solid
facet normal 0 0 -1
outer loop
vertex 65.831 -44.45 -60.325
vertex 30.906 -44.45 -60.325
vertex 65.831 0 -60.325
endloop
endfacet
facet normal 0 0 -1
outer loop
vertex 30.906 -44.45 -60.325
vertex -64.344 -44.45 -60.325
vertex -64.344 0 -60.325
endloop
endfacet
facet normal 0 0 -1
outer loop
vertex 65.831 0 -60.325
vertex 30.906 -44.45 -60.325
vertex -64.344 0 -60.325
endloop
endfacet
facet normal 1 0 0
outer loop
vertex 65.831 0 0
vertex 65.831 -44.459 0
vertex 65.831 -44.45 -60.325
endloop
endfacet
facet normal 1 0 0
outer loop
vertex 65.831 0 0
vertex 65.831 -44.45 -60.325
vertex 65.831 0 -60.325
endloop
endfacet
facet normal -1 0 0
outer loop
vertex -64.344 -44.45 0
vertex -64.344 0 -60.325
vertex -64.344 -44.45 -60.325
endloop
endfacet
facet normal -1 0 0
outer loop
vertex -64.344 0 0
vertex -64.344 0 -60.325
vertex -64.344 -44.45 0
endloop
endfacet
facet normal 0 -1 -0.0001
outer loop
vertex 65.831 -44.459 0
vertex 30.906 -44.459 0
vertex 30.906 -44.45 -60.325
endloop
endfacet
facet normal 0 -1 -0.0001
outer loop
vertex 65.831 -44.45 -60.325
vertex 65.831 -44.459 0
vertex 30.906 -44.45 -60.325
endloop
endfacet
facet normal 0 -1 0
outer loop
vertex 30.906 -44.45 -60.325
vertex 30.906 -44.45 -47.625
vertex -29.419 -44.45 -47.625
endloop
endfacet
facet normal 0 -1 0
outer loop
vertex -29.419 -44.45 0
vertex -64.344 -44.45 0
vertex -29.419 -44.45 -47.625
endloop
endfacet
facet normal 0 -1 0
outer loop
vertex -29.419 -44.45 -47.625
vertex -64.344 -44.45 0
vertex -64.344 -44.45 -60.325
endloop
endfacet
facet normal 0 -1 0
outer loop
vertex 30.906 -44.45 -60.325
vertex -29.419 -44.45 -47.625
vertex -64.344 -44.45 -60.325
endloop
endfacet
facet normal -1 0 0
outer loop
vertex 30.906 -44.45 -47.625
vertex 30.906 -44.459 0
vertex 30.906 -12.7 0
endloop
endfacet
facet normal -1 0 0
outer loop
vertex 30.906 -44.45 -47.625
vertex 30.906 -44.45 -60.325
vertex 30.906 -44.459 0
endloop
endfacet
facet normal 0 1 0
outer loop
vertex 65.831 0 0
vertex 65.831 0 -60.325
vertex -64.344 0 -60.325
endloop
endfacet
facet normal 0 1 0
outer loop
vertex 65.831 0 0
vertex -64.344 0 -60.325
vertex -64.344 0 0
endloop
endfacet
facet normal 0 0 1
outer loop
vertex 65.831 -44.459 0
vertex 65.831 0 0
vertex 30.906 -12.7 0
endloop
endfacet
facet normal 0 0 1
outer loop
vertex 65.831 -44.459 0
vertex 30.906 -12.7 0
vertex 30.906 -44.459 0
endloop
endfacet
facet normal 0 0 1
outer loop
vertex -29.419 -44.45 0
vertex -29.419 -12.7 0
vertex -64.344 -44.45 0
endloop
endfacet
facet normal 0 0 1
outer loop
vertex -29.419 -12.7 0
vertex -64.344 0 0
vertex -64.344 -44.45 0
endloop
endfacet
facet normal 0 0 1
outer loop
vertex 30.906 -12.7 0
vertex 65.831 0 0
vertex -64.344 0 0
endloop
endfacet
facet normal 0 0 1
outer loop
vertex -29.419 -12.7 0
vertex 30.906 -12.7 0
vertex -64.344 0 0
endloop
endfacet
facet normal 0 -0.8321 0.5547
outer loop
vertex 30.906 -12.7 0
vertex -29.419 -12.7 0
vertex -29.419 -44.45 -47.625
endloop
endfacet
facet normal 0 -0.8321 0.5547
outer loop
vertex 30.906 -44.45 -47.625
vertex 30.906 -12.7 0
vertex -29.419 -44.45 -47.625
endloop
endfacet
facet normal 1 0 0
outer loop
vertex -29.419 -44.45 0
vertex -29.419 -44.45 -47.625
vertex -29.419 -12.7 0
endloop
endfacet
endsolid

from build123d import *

# Parameters (mm, degrees)
F0_W     = 34.925
F0_H     = 60.325
F1_DEPTH = 44.45
F3_DEPTH = 60.325
F5_DEPTH = 34.925


with BuildPart() as f1:
    # F0 (on Front) → F1 (new body)
    with BuildSketch(Plane.XZ):
        with Locations((-46.881634, -30.1625)):
            Rectangle(F0_W, F0_H)
    extrude(amount=F1_DEPTH)

    # F2 (on face) → F3 (join)
    with BuildSketch(Plane.YZ.offset(-29.419134)):
        Polygon((-44.45, -47.625), (-44.45, -60.325), (0, -60.325), (0, -47.625), (0, 0), (-12.7, 0), align=None)
    extrude(amount=F3_DEPTH)

    # F4 (on face) → F5 (join)
    with BuildSketch(Plane.YZ.offset(30.905866)):
        Polygon((-44.45, -47.625), (-12.7, 0), (-44.459421, 0), (-44.45, -60.325), align=None)
        Polygon((0, -60.325), (0, 0), (-12.7, 0), (-44.45, -47.625), (-44.45, -60.325), align=None)
    extrude(amount=F5_DEPTH)


solid = f1.part
